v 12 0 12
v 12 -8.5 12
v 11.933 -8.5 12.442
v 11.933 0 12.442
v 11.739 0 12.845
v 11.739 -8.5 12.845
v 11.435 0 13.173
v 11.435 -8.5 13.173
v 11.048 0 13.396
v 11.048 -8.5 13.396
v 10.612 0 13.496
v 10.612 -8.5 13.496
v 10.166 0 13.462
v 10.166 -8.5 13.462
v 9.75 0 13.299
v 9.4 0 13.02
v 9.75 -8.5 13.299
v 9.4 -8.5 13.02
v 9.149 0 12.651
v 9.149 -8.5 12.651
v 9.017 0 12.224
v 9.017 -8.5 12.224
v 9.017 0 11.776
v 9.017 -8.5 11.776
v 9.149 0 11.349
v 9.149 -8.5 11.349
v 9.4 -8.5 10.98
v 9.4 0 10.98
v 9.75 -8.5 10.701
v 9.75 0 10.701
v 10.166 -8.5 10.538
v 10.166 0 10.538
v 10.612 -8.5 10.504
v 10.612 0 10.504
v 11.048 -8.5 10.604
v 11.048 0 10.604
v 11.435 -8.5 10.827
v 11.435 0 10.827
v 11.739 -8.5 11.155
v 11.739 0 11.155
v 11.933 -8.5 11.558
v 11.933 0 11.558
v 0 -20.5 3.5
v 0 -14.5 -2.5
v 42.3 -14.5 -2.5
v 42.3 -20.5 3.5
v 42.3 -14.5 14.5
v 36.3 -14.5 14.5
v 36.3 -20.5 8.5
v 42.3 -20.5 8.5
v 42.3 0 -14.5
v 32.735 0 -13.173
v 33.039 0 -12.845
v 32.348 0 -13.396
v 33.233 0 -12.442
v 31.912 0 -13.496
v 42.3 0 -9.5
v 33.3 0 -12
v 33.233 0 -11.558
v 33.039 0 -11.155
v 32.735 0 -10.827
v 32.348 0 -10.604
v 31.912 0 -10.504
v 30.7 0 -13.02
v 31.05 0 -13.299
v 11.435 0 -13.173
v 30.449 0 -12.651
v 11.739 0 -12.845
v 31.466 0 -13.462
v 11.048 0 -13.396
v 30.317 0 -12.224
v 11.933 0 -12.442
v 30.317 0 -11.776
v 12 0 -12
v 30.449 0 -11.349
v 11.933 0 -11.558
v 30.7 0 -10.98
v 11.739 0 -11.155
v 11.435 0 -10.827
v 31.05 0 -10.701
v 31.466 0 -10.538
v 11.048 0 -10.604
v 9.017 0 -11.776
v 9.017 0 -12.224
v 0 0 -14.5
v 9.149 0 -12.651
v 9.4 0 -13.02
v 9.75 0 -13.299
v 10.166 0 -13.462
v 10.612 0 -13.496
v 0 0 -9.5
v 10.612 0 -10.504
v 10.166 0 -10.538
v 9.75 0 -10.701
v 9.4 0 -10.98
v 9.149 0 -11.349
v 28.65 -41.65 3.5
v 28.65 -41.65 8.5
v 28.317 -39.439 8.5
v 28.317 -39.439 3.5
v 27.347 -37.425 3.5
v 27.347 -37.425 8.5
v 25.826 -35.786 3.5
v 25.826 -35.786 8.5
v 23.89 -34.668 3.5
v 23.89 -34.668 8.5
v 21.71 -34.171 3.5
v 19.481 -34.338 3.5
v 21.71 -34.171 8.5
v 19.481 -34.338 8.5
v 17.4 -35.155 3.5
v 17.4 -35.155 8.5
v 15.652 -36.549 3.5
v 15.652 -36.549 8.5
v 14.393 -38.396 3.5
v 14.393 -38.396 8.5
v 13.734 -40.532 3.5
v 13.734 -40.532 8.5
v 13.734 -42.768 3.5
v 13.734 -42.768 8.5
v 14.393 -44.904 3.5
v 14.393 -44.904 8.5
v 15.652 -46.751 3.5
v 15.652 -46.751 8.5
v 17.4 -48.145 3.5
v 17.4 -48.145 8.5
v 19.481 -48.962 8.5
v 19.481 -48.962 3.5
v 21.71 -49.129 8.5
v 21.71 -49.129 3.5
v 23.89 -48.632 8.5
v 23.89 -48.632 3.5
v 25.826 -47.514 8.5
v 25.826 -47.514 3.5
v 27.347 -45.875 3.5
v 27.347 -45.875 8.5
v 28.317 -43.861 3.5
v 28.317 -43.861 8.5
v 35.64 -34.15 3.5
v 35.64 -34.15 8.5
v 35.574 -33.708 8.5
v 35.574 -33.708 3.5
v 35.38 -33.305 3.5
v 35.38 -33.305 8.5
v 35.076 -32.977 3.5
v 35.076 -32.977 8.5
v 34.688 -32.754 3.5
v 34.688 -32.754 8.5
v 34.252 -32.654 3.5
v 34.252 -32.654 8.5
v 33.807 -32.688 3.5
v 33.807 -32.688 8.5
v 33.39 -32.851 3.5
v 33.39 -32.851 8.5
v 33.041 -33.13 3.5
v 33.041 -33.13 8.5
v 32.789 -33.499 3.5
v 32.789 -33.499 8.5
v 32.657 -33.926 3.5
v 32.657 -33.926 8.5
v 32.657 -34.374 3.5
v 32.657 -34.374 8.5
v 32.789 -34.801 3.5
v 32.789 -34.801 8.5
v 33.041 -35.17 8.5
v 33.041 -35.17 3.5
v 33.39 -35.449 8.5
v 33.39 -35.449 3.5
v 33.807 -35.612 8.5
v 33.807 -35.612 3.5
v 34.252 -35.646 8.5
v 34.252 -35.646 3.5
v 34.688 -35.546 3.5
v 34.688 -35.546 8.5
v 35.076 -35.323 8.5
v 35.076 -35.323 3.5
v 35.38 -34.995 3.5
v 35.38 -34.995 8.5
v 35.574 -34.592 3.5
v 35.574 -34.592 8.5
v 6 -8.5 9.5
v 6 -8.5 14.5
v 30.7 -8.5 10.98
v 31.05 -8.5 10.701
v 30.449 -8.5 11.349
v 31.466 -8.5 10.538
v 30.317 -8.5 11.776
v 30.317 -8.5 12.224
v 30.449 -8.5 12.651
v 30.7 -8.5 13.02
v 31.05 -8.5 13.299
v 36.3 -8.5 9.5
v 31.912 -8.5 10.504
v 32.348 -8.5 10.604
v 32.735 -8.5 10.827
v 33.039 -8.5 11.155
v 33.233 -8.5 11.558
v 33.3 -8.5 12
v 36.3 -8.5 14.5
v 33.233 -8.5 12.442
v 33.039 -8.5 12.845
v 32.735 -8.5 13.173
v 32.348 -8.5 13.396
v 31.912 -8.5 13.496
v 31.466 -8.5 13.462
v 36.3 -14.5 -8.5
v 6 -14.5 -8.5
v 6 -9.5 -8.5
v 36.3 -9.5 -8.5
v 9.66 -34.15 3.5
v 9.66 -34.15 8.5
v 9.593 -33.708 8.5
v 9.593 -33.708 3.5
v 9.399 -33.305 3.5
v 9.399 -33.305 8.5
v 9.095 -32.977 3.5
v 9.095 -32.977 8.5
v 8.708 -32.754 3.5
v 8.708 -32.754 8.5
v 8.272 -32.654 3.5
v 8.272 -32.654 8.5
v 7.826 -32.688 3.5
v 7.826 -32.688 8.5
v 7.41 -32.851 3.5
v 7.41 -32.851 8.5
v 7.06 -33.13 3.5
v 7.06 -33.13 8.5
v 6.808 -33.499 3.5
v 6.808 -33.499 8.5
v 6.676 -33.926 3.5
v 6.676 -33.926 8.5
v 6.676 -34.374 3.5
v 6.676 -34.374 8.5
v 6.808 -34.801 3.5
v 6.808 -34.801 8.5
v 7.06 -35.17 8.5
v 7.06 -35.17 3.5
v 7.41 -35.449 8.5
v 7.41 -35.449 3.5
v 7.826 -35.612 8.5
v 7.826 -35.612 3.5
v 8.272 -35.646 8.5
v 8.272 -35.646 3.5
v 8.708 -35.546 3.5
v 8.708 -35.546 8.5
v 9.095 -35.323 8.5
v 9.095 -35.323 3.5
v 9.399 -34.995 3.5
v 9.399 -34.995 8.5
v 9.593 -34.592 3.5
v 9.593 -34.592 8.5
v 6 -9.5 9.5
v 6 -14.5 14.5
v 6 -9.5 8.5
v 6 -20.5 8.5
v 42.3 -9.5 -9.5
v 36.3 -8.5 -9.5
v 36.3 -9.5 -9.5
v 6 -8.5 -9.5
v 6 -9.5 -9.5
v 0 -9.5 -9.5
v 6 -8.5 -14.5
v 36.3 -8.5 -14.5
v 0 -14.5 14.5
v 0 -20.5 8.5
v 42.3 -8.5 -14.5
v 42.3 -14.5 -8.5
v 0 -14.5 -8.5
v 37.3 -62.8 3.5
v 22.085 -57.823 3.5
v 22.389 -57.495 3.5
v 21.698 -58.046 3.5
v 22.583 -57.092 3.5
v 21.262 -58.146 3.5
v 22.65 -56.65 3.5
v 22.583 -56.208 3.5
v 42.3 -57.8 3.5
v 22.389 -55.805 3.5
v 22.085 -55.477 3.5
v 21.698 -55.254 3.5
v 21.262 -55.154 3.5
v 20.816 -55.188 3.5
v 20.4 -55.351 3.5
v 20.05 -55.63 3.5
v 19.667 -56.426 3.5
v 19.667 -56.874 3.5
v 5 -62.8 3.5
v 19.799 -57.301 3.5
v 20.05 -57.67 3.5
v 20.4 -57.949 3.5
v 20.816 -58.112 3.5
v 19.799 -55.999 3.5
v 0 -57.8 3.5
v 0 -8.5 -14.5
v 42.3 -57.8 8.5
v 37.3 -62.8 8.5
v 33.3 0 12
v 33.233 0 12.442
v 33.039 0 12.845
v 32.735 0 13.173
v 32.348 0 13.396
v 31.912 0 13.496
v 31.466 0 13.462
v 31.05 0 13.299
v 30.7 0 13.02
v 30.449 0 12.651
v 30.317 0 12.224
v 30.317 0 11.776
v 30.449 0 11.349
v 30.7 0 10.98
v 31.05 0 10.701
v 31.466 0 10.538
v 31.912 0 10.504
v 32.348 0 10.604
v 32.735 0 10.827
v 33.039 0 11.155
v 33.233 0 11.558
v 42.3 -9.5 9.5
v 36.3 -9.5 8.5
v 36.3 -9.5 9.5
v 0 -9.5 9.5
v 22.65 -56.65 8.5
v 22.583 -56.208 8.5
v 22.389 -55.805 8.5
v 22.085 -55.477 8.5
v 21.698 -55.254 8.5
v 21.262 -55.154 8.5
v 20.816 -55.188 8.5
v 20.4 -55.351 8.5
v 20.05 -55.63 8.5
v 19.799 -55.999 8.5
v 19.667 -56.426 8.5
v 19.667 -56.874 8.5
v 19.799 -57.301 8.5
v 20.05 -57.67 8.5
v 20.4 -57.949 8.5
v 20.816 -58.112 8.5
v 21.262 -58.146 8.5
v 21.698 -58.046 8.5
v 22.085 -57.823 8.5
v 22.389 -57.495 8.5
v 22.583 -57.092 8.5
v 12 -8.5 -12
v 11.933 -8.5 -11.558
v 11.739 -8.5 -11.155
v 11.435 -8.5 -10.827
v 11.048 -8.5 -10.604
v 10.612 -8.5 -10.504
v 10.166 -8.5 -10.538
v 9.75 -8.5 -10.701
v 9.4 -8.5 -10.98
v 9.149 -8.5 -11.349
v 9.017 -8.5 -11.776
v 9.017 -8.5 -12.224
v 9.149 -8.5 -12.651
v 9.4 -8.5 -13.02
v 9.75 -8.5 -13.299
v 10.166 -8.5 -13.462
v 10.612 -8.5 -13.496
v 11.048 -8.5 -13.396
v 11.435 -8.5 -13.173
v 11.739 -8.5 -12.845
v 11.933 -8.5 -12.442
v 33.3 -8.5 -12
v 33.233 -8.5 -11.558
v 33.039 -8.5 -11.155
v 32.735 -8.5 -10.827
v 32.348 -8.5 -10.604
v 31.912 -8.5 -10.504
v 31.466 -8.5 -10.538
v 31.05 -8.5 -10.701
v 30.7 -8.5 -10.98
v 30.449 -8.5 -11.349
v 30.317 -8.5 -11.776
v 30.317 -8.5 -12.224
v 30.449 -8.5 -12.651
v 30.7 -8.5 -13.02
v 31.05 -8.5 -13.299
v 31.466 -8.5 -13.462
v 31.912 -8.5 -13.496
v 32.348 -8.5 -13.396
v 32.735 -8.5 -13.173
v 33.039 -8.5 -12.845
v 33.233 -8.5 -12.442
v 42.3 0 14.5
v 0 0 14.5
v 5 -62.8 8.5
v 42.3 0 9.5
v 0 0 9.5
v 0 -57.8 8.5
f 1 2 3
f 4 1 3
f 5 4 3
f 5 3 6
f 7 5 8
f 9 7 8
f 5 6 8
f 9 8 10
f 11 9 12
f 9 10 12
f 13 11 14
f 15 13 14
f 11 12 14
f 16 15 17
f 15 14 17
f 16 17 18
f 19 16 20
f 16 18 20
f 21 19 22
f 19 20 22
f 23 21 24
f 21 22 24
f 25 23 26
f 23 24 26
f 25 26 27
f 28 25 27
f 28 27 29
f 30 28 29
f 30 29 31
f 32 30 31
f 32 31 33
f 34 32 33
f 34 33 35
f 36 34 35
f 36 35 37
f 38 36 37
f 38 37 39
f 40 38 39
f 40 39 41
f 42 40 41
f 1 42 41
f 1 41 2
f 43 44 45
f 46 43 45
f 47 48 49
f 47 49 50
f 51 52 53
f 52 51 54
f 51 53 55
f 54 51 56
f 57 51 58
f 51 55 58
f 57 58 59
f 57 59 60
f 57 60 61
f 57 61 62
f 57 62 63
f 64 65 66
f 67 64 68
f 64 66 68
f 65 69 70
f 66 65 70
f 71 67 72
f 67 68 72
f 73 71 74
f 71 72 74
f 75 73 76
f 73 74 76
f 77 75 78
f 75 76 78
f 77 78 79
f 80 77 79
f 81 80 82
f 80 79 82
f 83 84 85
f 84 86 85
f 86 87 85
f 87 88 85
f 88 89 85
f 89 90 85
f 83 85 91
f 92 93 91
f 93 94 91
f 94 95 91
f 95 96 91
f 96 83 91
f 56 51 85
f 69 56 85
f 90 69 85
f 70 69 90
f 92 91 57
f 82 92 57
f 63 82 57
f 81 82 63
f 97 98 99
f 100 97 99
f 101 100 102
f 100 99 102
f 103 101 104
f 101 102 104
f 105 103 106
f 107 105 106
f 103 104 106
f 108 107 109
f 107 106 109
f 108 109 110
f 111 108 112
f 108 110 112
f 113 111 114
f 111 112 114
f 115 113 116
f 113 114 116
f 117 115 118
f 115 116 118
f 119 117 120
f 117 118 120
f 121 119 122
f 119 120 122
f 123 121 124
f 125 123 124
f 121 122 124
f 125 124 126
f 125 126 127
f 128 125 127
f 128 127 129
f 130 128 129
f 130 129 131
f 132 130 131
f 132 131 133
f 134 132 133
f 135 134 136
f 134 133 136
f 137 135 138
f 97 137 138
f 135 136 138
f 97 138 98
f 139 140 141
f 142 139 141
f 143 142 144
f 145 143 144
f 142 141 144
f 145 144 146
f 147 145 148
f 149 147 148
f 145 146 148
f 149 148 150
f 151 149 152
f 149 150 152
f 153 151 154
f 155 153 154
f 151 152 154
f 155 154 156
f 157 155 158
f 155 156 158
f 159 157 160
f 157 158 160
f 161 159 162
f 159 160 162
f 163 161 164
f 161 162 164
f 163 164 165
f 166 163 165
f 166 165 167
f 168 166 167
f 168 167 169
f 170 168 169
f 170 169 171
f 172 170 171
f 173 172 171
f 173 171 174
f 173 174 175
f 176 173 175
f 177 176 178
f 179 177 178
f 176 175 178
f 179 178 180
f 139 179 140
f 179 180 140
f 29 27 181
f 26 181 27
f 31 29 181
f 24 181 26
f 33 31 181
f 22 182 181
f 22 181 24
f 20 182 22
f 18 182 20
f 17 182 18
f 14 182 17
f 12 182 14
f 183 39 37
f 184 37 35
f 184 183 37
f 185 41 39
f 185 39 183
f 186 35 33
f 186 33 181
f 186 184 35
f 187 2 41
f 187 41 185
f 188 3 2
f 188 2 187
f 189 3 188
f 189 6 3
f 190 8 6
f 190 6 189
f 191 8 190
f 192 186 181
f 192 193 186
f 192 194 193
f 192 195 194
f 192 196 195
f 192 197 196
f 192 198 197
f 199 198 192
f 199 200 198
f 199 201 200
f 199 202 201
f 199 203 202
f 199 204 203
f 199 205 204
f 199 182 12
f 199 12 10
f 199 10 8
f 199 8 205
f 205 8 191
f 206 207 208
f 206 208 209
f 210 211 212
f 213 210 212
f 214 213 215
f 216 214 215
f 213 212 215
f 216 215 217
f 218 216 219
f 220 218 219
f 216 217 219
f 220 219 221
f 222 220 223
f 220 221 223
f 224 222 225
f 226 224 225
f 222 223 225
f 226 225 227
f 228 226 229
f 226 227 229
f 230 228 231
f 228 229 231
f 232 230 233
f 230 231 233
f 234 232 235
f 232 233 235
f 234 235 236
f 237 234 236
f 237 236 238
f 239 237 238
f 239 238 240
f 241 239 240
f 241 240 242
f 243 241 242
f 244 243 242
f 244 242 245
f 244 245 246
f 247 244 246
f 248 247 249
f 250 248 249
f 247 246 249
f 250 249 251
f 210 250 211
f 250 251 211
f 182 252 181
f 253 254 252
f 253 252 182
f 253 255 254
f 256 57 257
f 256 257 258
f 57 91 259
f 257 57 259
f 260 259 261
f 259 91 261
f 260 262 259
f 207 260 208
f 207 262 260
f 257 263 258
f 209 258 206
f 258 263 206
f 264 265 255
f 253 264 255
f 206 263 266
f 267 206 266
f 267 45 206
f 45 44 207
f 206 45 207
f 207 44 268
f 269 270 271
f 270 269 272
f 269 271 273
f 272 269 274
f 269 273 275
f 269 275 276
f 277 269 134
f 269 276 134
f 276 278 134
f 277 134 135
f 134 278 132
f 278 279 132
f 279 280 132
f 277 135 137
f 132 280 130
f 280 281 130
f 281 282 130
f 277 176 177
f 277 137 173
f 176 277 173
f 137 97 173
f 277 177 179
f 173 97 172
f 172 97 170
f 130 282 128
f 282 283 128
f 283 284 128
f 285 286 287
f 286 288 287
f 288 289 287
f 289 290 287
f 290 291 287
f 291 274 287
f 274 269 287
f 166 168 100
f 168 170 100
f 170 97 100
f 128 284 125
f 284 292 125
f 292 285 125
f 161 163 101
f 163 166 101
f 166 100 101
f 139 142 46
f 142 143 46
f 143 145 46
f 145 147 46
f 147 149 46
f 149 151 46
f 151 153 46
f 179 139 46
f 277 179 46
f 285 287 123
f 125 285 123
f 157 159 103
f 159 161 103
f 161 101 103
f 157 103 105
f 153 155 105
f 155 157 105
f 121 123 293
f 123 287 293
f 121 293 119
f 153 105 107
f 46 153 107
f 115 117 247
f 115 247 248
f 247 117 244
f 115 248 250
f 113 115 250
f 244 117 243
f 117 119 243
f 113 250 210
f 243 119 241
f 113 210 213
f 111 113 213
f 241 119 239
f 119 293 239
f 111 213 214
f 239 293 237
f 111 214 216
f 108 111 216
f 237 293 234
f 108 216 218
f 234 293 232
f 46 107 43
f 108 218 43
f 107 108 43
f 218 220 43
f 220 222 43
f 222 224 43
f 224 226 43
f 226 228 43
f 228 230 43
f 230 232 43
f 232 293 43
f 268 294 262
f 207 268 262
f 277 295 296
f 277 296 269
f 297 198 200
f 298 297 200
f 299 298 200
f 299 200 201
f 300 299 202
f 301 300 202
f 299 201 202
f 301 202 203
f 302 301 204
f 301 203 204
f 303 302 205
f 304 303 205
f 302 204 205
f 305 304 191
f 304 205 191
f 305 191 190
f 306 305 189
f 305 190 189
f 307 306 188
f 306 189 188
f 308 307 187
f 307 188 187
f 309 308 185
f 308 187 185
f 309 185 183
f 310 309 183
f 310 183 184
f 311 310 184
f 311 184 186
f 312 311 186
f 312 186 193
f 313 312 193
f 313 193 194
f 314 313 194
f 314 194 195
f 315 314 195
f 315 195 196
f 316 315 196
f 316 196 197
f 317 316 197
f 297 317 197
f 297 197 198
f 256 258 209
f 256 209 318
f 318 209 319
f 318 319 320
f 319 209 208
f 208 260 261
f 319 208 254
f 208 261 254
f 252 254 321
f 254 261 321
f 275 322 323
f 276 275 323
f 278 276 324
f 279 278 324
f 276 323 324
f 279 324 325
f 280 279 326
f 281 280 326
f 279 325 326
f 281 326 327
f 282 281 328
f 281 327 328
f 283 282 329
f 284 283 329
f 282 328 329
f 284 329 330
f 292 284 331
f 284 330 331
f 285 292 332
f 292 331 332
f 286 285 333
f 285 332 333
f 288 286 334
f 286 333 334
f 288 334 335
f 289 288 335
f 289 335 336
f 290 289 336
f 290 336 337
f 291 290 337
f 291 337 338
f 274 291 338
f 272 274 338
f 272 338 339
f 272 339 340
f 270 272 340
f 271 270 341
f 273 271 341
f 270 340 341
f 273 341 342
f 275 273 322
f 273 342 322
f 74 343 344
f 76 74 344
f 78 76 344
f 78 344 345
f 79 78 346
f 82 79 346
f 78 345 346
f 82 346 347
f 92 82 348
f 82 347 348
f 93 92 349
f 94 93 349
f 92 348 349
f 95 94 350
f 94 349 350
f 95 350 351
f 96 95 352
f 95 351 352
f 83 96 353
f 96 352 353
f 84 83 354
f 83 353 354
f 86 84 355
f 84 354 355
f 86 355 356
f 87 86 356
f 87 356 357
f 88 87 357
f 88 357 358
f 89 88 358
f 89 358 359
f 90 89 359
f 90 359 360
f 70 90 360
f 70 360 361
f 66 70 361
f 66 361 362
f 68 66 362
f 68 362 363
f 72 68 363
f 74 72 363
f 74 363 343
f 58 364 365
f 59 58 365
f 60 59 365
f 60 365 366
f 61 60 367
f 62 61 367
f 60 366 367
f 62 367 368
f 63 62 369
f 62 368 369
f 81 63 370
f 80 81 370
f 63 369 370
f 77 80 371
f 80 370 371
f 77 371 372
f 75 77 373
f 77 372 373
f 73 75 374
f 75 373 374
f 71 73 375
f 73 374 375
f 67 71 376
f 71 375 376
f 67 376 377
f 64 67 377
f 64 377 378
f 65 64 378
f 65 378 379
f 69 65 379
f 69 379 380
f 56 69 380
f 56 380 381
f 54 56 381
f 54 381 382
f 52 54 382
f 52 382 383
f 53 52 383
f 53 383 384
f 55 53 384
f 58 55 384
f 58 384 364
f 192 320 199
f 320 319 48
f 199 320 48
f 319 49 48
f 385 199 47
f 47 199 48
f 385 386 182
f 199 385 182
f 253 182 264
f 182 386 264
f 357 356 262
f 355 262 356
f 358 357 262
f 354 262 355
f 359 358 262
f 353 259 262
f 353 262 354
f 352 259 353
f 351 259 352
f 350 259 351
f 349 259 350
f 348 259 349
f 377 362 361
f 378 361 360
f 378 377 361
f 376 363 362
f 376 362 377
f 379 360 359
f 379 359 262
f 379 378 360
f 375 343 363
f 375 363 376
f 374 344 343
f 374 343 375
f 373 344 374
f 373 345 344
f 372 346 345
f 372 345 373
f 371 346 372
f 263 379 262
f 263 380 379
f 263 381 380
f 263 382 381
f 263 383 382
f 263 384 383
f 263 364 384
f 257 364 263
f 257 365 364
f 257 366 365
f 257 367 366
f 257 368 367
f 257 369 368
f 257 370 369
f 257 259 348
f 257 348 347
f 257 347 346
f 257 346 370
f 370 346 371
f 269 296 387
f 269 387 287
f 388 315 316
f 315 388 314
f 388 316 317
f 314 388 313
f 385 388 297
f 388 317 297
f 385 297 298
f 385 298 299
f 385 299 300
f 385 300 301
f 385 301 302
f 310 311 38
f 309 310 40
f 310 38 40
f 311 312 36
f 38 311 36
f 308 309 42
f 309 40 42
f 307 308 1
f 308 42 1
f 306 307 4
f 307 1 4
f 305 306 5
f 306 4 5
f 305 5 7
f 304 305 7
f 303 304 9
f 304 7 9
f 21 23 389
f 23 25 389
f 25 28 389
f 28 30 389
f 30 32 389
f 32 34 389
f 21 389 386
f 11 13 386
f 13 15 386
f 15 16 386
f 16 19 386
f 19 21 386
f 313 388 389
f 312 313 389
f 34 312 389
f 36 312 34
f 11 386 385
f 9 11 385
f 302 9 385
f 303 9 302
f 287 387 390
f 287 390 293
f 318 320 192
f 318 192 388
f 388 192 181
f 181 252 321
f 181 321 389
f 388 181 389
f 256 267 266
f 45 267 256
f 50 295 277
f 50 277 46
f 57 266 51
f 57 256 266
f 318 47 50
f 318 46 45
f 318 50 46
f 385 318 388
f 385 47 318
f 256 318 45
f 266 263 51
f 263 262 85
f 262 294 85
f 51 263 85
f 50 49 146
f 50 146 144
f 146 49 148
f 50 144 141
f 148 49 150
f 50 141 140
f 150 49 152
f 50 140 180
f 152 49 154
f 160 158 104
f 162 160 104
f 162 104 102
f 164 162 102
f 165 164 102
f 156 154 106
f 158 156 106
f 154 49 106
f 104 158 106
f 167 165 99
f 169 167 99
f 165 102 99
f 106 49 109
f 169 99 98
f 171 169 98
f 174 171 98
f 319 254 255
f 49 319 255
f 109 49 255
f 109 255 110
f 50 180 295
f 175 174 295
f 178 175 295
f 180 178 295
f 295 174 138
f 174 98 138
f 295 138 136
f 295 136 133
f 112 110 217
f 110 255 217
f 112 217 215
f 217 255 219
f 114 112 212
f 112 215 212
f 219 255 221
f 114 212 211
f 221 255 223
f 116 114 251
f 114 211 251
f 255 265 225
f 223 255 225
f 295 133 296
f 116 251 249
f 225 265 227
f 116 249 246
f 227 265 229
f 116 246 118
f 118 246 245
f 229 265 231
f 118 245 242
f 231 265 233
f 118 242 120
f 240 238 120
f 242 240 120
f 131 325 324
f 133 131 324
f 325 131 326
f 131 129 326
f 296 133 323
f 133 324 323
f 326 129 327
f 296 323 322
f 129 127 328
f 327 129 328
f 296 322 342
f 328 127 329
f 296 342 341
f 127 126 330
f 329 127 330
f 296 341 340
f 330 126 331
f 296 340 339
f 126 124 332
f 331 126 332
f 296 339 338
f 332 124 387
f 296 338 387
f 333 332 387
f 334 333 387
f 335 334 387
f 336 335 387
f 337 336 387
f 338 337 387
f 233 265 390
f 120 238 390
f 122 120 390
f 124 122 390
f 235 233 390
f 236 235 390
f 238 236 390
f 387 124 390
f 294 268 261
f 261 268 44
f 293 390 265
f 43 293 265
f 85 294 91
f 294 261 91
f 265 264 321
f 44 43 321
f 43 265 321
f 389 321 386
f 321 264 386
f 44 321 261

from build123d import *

# Parameters (mm, degrees)
F1_DEPTH  = 42.3
F3_W      = 30.3
F3_H      = 6
F4_DEPTH  = 6
F2_W      = 30.3
F2_H      = 6
F5_DEPTH  = 12
F6_SIZE   = 5.99999
F7_R      = 1.5
F8_DEPTH  = 8.501
F9_R      = 1.5
F10_DEPTH = 8.501
F11_R     = 1.5
F11_R_2   = 7.5
F12_DEPTH = 5
F13_SIZE  = 5


# Not quite as in the source:
# - a fillet or chamfer is up to 0.001 mm smaller than in the source, because OpenCascade refuses the exact size
# - a feature names something its author has since deleted; it is built from what else it names


with BuildPart() as f1:
    # F0 (on Right) → F1 (new body)
    with BuildSketch(Plane.YZ):
        Polygon((-9.5, 9.5), (0, 9.5), (0, 14.5), (-14.5, 14.5), (-20.5, 14.5), (-20.5, 8.5), (-62.8, 8.5), (-62.8, 3.5), (-20.5, 3.5), (-20.5, -2.5), (-14.5, -2.5), (-14.5, -14.5), (0, -14.5), (0, -9.5), (-9.5, -9.5), align=None)
    extrude(amount=F1_DEPTH)

    # F3 (on face) → F4 (cut)
    with BuildSketch(Plane.XZ.offset(14.5)):
        with Locations((21.15, -11.5)):
            Rectangle(F3_W, F3_H)
    extrude(amount=-F4_DEPTH, mode=Mode.SUBTRACT)

    # F2 (on face) → F5 (cut)
    with BuildSketch(Plane.XZ.offset(20.5)):
        with Locations((21.15, 11.5)):
            Rectangle(F2_W, F2_H)
    extrude(amount=-F5_DEPTH, mode=Mode.SUBTRACT)

    # F6 (size 6 in the source; OpenCascade refuses exactly that, so slightly less here)
    f6_edges = [f1.edges().sort_by_distance(p)[0] for p in [
        (3, -14.5, -14.5),
        (39.3, -14.5, -14.5),
        (3, -20.5, 14.5),
        (39.3, -20.5, 14.5),
        (21.15, -20.5, -2.5),
    ]]
    chamfer(f6_edges, length=F6_SIZE)

    # F7 (on face) → F8 (cut, through all)
    with BuildSketch(Plane.XZ.offset(8.5)):
        with Locations((10.5, 12)):
            Circle(F7_R)
        with Locations((31.8, 12)):
            Circle(F7_R)
    extrude(amount=-F8_DEPTH, mode=Mode.SUBTRACT)

    # F9 (on face) → F10 (cut, through all)
    with BuildSketch(Plane.XZ.offset(8.5)):
        with Locations((10.5, -12)):
            Circle(F9_R)
        with Locations((31.8, -12)):
            Circle(F9_R)
    extrude(amount=-F10_DEPTH, mode=Mode.SUBTRACT)

    # F11 (on face) → F12 (cut, through all)
    with BuildSketch(Plane.XY.offset(8.5)):
        with Locations((8.1596189432, -34.15)):
            Circle(F11_R)
        with Locations((21.15, -41.65)):
            Circle(F11_R_2)
        with Locations((34.1403810568, -34.15)):
            Circle(F11_R)
        with Locations((21.15, -56.65)):
            Circle(F11_R)
    extrude(amount=-F12_DEPTH, mode=Mode.SUBTRACT)

    # F13
    f13_edges = [f1.edges().sort_by_distance(p)[0] for p in [
        (42.3, -62.8, 6),
        (0, -62.8, 6),
    ]]
    chamfer(f13_edges, length=F13_SIZE)


solid = f1.part
